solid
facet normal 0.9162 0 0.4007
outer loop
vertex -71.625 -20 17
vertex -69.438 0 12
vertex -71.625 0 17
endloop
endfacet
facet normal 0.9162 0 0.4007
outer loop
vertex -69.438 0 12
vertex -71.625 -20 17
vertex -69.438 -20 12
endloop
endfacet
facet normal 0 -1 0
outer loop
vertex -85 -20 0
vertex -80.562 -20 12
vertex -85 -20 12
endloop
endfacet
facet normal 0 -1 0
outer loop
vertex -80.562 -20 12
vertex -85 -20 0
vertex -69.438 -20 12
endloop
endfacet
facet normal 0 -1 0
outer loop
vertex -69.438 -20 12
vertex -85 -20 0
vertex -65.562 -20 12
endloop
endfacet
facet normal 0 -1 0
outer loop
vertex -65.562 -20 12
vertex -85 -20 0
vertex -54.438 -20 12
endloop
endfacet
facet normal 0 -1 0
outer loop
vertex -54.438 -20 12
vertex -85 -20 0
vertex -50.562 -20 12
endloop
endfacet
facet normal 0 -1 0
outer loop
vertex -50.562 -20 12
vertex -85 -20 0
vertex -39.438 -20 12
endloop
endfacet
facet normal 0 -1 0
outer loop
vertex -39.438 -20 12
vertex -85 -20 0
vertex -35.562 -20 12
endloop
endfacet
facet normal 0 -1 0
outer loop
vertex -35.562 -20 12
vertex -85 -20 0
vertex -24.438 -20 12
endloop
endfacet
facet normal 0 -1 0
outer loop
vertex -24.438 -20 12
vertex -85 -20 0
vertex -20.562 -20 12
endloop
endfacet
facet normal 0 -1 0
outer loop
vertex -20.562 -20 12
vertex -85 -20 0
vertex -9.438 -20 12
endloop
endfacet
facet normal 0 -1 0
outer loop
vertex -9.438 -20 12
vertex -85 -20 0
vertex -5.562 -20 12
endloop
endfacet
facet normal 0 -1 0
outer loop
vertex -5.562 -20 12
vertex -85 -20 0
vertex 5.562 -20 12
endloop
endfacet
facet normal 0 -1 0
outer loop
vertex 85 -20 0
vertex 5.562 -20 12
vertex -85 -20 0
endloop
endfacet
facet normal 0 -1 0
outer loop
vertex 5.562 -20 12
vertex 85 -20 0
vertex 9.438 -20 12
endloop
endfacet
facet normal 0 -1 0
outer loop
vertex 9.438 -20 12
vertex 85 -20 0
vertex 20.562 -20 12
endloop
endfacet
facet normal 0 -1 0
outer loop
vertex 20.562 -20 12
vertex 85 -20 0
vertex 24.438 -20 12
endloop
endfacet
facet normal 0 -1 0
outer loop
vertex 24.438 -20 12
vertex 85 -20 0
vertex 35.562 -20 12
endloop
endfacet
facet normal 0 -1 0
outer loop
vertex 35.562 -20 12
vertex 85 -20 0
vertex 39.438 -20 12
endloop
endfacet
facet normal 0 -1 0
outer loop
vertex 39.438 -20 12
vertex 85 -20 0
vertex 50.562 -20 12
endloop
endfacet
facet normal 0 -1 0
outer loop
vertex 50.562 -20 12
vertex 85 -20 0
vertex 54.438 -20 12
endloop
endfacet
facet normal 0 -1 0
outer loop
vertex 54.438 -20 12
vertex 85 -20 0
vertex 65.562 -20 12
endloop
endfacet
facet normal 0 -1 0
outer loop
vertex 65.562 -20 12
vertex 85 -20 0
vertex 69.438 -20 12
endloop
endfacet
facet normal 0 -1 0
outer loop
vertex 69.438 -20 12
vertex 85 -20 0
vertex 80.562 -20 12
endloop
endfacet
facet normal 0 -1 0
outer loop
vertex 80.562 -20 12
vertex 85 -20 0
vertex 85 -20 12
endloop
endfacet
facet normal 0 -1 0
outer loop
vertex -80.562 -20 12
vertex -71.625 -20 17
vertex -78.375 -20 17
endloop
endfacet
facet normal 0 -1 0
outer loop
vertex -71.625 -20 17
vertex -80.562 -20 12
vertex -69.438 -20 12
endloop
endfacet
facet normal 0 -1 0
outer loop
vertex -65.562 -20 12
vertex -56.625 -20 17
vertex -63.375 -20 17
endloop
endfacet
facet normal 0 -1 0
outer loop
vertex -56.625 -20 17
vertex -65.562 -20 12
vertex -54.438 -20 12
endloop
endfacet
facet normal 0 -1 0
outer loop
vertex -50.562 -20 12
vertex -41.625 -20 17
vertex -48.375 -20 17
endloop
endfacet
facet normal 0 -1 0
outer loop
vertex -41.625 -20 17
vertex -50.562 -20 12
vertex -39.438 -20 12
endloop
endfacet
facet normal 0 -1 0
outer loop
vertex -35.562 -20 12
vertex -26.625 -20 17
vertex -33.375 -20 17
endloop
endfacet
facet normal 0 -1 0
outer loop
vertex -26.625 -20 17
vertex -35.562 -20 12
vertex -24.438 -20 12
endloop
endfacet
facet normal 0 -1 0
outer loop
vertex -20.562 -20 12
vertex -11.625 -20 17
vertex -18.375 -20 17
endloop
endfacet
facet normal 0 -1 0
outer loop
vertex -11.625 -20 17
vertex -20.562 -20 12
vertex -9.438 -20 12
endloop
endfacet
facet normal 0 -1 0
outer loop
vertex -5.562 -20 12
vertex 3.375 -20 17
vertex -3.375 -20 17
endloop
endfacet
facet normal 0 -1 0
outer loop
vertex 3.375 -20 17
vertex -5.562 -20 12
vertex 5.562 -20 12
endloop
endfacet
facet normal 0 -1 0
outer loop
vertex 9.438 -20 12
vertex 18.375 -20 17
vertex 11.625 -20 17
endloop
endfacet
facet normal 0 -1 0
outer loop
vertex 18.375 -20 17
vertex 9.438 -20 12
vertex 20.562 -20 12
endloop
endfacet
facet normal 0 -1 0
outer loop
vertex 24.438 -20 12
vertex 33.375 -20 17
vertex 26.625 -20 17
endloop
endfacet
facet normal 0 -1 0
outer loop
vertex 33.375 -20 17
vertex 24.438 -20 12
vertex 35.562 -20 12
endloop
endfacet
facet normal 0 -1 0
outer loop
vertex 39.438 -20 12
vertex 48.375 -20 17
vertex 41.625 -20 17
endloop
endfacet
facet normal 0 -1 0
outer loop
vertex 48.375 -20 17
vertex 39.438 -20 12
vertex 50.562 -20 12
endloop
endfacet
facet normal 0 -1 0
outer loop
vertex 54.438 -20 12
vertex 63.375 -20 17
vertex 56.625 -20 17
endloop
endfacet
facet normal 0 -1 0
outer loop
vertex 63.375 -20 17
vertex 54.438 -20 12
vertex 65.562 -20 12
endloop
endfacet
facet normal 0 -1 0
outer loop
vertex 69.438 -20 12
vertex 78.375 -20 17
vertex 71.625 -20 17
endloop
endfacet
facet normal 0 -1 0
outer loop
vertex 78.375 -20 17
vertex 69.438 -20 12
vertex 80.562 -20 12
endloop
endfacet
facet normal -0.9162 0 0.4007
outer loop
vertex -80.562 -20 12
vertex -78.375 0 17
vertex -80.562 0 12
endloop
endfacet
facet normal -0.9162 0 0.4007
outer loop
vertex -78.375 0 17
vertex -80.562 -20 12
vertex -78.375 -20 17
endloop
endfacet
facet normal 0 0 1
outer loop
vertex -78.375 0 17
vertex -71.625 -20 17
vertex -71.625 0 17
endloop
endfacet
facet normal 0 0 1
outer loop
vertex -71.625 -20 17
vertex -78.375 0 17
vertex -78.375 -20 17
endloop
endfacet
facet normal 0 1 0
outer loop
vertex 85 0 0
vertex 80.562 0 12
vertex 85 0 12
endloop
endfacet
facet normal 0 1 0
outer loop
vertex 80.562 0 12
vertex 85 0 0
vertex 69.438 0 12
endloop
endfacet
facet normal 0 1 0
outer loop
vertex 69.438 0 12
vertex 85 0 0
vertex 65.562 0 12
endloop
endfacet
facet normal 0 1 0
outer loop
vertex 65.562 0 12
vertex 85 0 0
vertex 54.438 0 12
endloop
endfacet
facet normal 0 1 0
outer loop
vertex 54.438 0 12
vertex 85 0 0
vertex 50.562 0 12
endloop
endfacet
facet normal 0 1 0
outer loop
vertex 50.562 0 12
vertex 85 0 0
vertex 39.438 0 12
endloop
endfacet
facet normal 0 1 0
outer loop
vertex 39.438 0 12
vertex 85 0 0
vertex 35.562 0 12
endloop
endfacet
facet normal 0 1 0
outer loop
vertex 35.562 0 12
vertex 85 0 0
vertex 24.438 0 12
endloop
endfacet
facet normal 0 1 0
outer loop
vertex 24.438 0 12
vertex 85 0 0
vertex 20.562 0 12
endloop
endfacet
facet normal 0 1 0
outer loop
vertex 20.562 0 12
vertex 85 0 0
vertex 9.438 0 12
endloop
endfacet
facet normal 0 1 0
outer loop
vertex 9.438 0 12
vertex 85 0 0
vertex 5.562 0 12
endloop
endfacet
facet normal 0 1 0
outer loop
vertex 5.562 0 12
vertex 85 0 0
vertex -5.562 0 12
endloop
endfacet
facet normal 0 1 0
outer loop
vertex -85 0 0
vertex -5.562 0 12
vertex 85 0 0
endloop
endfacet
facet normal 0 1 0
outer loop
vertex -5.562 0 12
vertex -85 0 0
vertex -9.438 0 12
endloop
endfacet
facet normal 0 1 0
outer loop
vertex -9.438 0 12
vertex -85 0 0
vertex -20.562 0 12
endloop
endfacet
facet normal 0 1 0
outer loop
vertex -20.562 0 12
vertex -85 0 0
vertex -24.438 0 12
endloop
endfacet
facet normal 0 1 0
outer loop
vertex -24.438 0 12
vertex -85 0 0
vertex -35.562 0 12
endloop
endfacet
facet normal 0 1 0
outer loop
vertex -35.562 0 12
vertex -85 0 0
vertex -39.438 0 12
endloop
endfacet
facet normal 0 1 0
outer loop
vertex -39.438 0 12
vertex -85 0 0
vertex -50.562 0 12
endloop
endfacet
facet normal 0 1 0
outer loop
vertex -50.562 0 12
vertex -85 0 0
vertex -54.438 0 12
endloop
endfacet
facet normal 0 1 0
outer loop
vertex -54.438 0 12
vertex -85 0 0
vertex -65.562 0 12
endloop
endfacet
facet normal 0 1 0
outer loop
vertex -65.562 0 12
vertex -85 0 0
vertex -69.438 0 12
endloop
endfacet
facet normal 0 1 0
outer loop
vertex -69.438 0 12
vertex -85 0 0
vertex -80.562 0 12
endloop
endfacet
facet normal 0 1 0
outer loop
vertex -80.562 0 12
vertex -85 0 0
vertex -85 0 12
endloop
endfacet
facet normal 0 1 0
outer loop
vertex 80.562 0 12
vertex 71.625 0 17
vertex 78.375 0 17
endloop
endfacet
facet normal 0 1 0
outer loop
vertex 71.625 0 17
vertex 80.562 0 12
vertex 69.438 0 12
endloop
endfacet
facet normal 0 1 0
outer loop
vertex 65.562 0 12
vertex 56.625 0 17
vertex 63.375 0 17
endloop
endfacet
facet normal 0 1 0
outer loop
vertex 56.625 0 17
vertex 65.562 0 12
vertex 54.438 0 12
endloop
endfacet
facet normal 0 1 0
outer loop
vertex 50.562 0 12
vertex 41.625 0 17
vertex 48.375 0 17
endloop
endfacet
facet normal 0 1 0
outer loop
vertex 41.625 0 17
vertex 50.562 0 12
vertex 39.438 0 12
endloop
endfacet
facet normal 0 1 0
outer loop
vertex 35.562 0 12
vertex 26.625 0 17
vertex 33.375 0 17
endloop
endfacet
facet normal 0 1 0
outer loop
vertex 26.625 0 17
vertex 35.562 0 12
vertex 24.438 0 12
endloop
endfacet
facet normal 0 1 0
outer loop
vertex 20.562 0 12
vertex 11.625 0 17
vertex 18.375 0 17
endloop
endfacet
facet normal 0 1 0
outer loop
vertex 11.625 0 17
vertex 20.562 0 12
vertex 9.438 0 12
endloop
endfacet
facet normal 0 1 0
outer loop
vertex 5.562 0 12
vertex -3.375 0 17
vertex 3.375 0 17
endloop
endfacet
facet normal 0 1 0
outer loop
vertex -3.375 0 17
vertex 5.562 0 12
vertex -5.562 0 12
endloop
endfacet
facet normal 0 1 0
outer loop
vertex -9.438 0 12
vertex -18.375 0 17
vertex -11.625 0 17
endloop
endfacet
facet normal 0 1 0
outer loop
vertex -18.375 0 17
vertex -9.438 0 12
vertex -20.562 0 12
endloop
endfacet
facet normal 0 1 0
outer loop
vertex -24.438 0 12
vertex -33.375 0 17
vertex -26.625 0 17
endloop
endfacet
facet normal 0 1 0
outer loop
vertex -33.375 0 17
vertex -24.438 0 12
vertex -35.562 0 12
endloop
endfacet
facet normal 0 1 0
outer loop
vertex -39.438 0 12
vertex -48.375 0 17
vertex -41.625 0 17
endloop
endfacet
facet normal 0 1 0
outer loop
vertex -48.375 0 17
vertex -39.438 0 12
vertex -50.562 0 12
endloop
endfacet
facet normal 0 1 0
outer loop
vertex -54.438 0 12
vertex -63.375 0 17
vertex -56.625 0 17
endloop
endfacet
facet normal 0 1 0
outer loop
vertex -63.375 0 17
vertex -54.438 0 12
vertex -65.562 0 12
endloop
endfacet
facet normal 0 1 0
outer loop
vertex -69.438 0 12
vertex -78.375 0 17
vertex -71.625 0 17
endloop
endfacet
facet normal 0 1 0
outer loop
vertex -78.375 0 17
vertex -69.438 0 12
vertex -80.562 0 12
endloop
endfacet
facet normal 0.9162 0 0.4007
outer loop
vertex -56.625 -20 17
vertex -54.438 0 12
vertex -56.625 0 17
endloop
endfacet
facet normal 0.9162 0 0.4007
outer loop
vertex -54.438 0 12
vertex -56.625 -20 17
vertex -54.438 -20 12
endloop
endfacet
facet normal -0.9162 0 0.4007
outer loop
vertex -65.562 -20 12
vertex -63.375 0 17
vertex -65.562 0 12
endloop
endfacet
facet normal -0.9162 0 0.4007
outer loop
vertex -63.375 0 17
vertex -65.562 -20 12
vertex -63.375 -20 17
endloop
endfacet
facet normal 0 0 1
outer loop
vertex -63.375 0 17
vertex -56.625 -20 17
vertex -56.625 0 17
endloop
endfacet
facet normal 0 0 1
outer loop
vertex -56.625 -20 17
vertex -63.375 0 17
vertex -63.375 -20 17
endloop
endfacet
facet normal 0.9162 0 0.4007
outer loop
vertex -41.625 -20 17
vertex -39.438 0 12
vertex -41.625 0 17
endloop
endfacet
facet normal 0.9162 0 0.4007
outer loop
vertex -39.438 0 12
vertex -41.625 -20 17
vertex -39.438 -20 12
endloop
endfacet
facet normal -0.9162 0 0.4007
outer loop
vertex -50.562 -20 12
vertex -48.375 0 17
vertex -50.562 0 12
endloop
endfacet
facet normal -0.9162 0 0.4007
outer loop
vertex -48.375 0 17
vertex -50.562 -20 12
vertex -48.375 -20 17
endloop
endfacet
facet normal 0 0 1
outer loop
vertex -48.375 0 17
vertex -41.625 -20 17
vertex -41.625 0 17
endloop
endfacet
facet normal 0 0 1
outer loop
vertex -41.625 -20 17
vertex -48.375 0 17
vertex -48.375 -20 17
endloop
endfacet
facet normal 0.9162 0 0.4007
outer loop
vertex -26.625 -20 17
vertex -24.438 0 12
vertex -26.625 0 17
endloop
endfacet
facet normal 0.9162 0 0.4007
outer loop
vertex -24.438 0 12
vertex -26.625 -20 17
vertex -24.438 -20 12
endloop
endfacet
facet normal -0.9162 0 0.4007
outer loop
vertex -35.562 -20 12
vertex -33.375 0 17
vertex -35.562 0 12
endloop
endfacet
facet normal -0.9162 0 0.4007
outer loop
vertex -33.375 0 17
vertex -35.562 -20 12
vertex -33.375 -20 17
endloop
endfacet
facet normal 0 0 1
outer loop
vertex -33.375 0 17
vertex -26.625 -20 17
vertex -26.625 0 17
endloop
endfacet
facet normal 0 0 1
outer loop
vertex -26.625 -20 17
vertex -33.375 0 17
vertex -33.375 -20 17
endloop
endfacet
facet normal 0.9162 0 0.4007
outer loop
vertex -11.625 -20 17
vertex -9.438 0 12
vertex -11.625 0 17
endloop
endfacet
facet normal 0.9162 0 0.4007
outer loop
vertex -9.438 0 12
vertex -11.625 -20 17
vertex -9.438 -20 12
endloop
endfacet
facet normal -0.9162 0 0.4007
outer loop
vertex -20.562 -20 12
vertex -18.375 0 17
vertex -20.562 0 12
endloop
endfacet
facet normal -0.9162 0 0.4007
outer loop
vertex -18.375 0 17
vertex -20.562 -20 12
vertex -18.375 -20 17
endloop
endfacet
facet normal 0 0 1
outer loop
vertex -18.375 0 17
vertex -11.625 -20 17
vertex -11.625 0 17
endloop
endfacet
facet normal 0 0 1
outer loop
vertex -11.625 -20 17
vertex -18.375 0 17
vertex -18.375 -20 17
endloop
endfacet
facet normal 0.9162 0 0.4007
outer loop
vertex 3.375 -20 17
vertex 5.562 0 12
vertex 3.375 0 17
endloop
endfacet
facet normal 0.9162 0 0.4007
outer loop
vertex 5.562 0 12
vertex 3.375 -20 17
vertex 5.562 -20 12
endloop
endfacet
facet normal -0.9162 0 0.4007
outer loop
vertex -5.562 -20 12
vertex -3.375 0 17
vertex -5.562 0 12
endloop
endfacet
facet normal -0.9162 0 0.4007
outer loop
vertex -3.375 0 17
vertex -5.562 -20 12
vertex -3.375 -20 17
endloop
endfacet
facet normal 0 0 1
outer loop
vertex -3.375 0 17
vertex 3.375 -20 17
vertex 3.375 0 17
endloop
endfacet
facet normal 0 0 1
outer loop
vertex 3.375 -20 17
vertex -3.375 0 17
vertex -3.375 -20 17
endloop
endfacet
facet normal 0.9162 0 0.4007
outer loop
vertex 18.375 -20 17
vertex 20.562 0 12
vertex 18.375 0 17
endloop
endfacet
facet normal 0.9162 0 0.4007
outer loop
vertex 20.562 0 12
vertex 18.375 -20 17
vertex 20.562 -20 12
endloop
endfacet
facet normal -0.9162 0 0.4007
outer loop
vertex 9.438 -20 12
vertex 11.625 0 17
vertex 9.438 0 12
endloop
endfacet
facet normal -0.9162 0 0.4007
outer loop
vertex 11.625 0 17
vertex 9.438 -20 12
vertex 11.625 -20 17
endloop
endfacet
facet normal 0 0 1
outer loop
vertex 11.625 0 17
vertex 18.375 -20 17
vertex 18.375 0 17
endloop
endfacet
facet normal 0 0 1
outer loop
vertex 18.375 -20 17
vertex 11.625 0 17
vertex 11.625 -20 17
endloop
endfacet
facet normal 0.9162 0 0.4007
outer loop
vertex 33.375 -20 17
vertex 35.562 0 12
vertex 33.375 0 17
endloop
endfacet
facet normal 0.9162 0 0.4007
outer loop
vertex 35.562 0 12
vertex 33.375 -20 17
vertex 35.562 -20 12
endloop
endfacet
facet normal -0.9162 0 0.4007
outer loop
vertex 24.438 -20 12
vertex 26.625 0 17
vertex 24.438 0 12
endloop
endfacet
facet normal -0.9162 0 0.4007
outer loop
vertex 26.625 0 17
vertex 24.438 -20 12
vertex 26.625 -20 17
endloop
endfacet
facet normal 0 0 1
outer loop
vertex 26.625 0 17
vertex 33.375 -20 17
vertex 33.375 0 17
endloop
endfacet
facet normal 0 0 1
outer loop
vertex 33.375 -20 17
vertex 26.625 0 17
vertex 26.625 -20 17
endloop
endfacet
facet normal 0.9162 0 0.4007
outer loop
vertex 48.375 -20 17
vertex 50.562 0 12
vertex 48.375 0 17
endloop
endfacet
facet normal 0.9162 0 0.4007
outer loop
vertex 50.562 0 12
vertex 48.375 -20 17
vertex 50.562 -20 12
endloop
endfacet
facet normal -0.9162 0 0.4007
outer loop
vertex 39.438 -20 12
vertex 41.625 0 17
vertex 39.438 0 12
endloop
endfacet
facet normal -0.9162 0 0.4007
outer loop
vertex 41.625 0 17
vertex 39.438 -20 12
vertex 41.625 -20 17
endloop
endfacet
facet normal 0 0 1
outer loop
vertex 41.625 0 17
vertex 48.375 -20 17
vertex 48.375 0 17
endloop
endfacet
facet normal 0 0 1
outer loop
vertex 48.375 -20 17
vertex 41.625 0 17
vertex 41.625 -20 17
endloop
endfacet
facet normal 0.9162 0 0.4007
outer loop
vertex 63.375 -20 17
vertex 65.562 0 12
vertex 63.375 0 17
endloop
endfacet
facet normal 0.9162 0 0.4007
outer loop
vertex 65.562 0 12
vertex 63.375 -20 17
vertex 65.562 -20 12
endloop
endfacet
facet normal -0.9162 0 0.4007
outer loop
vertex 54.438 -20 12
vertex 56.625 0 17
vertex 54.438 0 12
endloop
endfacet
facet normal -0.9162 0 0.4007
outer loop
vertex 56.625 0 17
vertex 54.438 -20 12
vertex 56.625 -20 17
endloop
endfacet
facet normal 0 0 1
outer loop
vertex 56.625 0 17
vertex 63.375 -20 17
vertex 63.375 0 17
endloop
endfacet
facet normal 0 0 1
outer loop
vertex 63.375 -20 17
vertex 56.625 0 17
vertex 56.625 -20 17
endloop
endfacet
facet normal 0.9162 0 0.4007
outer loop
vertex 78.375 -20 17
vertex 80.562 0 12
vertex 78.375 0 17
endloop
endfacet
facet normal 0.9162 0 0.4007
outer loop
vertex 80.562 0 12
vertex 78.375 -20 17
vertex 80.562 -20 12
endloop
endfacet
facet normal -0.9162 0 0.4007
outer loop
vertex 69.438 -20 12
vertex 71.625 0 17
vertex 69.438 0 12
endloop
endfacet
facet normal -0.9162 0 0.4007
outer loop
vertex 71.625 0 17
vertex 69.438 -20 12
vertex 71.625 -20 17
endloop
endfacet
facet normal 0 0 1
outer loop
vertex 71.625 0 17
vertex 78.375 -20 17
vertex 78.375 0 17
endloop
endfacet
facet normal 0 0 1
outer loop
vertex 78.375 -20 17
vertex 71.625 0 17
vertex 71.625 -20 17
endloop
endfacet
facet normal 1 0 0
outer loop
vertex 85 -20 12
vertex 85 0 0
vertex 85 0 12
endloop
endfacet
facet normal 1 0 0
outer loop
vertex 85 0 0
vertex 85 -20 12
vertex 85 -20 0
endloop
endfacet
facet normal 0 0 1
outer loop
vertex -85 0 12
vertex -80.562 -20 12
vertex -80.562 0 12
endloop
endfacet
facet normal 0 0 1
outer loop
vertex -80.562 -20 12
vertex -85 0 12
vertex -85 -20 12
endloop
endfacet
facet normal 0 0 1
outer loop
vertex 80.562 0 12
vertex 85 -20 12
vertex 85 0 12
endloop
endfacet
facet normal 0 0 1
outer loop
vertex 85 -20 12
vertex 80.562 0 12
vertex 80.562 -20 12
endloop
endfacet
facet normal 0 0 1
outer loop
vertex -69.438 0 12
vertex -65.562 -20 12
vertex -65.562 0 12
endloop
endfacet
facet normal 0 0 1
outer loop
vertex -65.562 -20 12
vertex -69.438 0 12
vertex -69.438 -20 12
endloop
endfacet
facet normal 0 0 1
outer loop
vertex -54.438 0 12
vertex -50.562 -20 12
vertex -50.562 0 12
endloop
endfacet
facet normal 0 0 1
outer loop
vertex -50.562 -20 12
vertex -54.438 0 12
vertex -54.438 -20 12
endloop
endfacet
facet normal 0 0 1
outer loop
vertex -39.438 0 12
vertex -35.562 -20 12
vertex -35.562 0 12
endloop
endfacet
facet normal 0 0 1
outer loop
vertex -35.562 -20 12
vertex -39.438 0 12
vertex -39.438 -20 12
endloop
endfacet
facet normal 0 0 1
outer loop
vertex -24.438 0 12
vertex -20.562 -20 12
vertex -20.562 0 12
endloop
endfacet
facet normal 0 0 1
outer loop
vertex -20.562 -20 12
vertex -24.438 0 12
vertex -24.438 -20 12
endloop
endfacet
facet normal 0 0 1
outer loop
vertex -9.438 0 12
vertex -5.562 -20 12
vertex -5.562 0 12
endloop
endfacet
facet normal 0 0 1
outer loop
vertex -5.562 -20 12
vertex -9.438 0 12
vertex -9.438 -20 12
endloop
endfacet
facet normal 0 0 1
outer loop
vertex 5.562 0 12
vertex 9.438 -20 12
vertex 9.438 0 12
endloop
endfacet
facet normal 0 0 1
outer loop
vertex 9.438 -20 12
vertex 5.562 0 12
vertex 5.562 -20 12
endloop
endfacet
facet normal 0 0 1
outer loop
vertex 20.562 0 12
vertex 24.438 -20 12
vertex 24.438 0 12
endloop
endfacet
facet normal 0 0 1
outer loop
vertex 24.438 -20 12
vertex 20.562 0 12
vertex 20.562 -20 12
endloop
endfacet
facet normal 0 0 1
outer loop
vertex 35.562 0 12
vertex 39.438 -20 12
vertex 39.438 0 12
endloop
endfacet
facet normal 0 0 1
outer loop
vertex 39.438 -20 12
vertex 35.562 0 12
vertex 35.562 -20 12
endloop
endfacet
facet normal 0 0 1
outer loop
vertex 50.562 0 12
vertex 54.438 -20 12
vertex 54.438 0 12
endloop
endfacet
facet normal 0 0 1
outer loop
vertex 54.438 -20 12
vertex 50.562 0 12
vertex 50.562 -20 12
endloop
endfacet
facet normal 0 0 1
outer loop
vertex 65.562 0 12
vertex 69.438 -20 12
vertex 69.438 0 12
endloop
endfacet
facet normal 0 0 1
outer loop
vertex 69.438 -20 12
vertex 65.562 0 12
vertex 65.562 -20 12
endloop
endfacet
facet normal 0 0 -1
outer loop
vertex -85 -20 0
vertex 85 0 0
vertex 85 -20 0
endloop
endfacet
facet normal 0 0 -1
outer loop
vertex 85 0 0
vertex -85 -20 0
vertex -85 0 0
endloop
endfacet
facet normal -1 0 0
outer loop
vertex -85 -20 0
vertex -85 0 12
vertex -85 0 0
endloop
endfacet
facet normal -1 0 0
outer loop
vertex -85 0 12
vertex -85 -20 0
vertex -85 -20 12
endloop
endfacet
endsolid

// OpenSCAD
$fn = 32;

// ----------------------------------------------------------------------
// Toothed rack, 11 teeth
// 15 mm pitch, 5 mm teeth
// ----------------------------------------------------------------------

// --- parameters (mm) ---
bar_w = 20;      // bar width (Y)
bar_h = 12;      // bar height (Z)
teeth = 11;      // number of teeth
pitch = 15;      // tooth pitch
tooth_h = 5;     // tooth height above the bar
root_w = 12;     // tooth width at the root
crest_w = 6.75;  // tooth width at the crest

// --- derived feature positions (mm) ---
span = (teeth - 1) * pitch;  // = 150   distance between the outer teeth
bar_l = span + root_w + 8;   // = 170   bar length: teeth plus 4 mm at each end
tooth_x = -span / 2;         // = -75   X of the first tooth
height = bar_h + tooth_h;    // = 17   overall height
feature_centers = [
  [tooth_x + 0 * pitch, -bar_w / 2],
  [tooth_x + 1 * pitch, -bar_w / 2],
  [tooth_x + 2 * pitch, -bar_w / 2],
  [tooth_x + 3 * pitch, -bar_w / 2],
  [tooth_x + 4 * pitch, -bar_w / 2],
  [tooth_x + 5 * pitch, -bar_w / 2],
  [tooth_x + 6 * pitch, -bar_w / 2],
  [tooth_x + 7 * pitch, -bar_w / 2],
  [tooth_x + 8 * pitch, -bar_w / 2],
  [tooth_x + 9 * pitch, -bar_w / 2],
  [tooth_x + 10 * pitch, -bar_w / 2]
];   // tooth centre line, drives the tooth loop

// bar with a rack of teeth, one extruded trapezoium per centre
module rack_tooth() {
  linear_extrude(height = bar_w)
    polygon(points = [
      [0, 0],
      [root_w, 0],
      [root_w / 2 + crest_w / 2, tooth_h + 1],
      [root_w / 2 - crest_w / 2, tooth_h + 1]
    ]);
}

union() {
  translate([-bar_l / 2, -bar_w, 0]) cube([bar_l, bar_w, bar_h]);
  for (centre = feature_centers)
    translate([centre[0] - root_w / 2, 0, bar_h - 1]) rotate([90, 0, 0]) rack_tooth();
}
